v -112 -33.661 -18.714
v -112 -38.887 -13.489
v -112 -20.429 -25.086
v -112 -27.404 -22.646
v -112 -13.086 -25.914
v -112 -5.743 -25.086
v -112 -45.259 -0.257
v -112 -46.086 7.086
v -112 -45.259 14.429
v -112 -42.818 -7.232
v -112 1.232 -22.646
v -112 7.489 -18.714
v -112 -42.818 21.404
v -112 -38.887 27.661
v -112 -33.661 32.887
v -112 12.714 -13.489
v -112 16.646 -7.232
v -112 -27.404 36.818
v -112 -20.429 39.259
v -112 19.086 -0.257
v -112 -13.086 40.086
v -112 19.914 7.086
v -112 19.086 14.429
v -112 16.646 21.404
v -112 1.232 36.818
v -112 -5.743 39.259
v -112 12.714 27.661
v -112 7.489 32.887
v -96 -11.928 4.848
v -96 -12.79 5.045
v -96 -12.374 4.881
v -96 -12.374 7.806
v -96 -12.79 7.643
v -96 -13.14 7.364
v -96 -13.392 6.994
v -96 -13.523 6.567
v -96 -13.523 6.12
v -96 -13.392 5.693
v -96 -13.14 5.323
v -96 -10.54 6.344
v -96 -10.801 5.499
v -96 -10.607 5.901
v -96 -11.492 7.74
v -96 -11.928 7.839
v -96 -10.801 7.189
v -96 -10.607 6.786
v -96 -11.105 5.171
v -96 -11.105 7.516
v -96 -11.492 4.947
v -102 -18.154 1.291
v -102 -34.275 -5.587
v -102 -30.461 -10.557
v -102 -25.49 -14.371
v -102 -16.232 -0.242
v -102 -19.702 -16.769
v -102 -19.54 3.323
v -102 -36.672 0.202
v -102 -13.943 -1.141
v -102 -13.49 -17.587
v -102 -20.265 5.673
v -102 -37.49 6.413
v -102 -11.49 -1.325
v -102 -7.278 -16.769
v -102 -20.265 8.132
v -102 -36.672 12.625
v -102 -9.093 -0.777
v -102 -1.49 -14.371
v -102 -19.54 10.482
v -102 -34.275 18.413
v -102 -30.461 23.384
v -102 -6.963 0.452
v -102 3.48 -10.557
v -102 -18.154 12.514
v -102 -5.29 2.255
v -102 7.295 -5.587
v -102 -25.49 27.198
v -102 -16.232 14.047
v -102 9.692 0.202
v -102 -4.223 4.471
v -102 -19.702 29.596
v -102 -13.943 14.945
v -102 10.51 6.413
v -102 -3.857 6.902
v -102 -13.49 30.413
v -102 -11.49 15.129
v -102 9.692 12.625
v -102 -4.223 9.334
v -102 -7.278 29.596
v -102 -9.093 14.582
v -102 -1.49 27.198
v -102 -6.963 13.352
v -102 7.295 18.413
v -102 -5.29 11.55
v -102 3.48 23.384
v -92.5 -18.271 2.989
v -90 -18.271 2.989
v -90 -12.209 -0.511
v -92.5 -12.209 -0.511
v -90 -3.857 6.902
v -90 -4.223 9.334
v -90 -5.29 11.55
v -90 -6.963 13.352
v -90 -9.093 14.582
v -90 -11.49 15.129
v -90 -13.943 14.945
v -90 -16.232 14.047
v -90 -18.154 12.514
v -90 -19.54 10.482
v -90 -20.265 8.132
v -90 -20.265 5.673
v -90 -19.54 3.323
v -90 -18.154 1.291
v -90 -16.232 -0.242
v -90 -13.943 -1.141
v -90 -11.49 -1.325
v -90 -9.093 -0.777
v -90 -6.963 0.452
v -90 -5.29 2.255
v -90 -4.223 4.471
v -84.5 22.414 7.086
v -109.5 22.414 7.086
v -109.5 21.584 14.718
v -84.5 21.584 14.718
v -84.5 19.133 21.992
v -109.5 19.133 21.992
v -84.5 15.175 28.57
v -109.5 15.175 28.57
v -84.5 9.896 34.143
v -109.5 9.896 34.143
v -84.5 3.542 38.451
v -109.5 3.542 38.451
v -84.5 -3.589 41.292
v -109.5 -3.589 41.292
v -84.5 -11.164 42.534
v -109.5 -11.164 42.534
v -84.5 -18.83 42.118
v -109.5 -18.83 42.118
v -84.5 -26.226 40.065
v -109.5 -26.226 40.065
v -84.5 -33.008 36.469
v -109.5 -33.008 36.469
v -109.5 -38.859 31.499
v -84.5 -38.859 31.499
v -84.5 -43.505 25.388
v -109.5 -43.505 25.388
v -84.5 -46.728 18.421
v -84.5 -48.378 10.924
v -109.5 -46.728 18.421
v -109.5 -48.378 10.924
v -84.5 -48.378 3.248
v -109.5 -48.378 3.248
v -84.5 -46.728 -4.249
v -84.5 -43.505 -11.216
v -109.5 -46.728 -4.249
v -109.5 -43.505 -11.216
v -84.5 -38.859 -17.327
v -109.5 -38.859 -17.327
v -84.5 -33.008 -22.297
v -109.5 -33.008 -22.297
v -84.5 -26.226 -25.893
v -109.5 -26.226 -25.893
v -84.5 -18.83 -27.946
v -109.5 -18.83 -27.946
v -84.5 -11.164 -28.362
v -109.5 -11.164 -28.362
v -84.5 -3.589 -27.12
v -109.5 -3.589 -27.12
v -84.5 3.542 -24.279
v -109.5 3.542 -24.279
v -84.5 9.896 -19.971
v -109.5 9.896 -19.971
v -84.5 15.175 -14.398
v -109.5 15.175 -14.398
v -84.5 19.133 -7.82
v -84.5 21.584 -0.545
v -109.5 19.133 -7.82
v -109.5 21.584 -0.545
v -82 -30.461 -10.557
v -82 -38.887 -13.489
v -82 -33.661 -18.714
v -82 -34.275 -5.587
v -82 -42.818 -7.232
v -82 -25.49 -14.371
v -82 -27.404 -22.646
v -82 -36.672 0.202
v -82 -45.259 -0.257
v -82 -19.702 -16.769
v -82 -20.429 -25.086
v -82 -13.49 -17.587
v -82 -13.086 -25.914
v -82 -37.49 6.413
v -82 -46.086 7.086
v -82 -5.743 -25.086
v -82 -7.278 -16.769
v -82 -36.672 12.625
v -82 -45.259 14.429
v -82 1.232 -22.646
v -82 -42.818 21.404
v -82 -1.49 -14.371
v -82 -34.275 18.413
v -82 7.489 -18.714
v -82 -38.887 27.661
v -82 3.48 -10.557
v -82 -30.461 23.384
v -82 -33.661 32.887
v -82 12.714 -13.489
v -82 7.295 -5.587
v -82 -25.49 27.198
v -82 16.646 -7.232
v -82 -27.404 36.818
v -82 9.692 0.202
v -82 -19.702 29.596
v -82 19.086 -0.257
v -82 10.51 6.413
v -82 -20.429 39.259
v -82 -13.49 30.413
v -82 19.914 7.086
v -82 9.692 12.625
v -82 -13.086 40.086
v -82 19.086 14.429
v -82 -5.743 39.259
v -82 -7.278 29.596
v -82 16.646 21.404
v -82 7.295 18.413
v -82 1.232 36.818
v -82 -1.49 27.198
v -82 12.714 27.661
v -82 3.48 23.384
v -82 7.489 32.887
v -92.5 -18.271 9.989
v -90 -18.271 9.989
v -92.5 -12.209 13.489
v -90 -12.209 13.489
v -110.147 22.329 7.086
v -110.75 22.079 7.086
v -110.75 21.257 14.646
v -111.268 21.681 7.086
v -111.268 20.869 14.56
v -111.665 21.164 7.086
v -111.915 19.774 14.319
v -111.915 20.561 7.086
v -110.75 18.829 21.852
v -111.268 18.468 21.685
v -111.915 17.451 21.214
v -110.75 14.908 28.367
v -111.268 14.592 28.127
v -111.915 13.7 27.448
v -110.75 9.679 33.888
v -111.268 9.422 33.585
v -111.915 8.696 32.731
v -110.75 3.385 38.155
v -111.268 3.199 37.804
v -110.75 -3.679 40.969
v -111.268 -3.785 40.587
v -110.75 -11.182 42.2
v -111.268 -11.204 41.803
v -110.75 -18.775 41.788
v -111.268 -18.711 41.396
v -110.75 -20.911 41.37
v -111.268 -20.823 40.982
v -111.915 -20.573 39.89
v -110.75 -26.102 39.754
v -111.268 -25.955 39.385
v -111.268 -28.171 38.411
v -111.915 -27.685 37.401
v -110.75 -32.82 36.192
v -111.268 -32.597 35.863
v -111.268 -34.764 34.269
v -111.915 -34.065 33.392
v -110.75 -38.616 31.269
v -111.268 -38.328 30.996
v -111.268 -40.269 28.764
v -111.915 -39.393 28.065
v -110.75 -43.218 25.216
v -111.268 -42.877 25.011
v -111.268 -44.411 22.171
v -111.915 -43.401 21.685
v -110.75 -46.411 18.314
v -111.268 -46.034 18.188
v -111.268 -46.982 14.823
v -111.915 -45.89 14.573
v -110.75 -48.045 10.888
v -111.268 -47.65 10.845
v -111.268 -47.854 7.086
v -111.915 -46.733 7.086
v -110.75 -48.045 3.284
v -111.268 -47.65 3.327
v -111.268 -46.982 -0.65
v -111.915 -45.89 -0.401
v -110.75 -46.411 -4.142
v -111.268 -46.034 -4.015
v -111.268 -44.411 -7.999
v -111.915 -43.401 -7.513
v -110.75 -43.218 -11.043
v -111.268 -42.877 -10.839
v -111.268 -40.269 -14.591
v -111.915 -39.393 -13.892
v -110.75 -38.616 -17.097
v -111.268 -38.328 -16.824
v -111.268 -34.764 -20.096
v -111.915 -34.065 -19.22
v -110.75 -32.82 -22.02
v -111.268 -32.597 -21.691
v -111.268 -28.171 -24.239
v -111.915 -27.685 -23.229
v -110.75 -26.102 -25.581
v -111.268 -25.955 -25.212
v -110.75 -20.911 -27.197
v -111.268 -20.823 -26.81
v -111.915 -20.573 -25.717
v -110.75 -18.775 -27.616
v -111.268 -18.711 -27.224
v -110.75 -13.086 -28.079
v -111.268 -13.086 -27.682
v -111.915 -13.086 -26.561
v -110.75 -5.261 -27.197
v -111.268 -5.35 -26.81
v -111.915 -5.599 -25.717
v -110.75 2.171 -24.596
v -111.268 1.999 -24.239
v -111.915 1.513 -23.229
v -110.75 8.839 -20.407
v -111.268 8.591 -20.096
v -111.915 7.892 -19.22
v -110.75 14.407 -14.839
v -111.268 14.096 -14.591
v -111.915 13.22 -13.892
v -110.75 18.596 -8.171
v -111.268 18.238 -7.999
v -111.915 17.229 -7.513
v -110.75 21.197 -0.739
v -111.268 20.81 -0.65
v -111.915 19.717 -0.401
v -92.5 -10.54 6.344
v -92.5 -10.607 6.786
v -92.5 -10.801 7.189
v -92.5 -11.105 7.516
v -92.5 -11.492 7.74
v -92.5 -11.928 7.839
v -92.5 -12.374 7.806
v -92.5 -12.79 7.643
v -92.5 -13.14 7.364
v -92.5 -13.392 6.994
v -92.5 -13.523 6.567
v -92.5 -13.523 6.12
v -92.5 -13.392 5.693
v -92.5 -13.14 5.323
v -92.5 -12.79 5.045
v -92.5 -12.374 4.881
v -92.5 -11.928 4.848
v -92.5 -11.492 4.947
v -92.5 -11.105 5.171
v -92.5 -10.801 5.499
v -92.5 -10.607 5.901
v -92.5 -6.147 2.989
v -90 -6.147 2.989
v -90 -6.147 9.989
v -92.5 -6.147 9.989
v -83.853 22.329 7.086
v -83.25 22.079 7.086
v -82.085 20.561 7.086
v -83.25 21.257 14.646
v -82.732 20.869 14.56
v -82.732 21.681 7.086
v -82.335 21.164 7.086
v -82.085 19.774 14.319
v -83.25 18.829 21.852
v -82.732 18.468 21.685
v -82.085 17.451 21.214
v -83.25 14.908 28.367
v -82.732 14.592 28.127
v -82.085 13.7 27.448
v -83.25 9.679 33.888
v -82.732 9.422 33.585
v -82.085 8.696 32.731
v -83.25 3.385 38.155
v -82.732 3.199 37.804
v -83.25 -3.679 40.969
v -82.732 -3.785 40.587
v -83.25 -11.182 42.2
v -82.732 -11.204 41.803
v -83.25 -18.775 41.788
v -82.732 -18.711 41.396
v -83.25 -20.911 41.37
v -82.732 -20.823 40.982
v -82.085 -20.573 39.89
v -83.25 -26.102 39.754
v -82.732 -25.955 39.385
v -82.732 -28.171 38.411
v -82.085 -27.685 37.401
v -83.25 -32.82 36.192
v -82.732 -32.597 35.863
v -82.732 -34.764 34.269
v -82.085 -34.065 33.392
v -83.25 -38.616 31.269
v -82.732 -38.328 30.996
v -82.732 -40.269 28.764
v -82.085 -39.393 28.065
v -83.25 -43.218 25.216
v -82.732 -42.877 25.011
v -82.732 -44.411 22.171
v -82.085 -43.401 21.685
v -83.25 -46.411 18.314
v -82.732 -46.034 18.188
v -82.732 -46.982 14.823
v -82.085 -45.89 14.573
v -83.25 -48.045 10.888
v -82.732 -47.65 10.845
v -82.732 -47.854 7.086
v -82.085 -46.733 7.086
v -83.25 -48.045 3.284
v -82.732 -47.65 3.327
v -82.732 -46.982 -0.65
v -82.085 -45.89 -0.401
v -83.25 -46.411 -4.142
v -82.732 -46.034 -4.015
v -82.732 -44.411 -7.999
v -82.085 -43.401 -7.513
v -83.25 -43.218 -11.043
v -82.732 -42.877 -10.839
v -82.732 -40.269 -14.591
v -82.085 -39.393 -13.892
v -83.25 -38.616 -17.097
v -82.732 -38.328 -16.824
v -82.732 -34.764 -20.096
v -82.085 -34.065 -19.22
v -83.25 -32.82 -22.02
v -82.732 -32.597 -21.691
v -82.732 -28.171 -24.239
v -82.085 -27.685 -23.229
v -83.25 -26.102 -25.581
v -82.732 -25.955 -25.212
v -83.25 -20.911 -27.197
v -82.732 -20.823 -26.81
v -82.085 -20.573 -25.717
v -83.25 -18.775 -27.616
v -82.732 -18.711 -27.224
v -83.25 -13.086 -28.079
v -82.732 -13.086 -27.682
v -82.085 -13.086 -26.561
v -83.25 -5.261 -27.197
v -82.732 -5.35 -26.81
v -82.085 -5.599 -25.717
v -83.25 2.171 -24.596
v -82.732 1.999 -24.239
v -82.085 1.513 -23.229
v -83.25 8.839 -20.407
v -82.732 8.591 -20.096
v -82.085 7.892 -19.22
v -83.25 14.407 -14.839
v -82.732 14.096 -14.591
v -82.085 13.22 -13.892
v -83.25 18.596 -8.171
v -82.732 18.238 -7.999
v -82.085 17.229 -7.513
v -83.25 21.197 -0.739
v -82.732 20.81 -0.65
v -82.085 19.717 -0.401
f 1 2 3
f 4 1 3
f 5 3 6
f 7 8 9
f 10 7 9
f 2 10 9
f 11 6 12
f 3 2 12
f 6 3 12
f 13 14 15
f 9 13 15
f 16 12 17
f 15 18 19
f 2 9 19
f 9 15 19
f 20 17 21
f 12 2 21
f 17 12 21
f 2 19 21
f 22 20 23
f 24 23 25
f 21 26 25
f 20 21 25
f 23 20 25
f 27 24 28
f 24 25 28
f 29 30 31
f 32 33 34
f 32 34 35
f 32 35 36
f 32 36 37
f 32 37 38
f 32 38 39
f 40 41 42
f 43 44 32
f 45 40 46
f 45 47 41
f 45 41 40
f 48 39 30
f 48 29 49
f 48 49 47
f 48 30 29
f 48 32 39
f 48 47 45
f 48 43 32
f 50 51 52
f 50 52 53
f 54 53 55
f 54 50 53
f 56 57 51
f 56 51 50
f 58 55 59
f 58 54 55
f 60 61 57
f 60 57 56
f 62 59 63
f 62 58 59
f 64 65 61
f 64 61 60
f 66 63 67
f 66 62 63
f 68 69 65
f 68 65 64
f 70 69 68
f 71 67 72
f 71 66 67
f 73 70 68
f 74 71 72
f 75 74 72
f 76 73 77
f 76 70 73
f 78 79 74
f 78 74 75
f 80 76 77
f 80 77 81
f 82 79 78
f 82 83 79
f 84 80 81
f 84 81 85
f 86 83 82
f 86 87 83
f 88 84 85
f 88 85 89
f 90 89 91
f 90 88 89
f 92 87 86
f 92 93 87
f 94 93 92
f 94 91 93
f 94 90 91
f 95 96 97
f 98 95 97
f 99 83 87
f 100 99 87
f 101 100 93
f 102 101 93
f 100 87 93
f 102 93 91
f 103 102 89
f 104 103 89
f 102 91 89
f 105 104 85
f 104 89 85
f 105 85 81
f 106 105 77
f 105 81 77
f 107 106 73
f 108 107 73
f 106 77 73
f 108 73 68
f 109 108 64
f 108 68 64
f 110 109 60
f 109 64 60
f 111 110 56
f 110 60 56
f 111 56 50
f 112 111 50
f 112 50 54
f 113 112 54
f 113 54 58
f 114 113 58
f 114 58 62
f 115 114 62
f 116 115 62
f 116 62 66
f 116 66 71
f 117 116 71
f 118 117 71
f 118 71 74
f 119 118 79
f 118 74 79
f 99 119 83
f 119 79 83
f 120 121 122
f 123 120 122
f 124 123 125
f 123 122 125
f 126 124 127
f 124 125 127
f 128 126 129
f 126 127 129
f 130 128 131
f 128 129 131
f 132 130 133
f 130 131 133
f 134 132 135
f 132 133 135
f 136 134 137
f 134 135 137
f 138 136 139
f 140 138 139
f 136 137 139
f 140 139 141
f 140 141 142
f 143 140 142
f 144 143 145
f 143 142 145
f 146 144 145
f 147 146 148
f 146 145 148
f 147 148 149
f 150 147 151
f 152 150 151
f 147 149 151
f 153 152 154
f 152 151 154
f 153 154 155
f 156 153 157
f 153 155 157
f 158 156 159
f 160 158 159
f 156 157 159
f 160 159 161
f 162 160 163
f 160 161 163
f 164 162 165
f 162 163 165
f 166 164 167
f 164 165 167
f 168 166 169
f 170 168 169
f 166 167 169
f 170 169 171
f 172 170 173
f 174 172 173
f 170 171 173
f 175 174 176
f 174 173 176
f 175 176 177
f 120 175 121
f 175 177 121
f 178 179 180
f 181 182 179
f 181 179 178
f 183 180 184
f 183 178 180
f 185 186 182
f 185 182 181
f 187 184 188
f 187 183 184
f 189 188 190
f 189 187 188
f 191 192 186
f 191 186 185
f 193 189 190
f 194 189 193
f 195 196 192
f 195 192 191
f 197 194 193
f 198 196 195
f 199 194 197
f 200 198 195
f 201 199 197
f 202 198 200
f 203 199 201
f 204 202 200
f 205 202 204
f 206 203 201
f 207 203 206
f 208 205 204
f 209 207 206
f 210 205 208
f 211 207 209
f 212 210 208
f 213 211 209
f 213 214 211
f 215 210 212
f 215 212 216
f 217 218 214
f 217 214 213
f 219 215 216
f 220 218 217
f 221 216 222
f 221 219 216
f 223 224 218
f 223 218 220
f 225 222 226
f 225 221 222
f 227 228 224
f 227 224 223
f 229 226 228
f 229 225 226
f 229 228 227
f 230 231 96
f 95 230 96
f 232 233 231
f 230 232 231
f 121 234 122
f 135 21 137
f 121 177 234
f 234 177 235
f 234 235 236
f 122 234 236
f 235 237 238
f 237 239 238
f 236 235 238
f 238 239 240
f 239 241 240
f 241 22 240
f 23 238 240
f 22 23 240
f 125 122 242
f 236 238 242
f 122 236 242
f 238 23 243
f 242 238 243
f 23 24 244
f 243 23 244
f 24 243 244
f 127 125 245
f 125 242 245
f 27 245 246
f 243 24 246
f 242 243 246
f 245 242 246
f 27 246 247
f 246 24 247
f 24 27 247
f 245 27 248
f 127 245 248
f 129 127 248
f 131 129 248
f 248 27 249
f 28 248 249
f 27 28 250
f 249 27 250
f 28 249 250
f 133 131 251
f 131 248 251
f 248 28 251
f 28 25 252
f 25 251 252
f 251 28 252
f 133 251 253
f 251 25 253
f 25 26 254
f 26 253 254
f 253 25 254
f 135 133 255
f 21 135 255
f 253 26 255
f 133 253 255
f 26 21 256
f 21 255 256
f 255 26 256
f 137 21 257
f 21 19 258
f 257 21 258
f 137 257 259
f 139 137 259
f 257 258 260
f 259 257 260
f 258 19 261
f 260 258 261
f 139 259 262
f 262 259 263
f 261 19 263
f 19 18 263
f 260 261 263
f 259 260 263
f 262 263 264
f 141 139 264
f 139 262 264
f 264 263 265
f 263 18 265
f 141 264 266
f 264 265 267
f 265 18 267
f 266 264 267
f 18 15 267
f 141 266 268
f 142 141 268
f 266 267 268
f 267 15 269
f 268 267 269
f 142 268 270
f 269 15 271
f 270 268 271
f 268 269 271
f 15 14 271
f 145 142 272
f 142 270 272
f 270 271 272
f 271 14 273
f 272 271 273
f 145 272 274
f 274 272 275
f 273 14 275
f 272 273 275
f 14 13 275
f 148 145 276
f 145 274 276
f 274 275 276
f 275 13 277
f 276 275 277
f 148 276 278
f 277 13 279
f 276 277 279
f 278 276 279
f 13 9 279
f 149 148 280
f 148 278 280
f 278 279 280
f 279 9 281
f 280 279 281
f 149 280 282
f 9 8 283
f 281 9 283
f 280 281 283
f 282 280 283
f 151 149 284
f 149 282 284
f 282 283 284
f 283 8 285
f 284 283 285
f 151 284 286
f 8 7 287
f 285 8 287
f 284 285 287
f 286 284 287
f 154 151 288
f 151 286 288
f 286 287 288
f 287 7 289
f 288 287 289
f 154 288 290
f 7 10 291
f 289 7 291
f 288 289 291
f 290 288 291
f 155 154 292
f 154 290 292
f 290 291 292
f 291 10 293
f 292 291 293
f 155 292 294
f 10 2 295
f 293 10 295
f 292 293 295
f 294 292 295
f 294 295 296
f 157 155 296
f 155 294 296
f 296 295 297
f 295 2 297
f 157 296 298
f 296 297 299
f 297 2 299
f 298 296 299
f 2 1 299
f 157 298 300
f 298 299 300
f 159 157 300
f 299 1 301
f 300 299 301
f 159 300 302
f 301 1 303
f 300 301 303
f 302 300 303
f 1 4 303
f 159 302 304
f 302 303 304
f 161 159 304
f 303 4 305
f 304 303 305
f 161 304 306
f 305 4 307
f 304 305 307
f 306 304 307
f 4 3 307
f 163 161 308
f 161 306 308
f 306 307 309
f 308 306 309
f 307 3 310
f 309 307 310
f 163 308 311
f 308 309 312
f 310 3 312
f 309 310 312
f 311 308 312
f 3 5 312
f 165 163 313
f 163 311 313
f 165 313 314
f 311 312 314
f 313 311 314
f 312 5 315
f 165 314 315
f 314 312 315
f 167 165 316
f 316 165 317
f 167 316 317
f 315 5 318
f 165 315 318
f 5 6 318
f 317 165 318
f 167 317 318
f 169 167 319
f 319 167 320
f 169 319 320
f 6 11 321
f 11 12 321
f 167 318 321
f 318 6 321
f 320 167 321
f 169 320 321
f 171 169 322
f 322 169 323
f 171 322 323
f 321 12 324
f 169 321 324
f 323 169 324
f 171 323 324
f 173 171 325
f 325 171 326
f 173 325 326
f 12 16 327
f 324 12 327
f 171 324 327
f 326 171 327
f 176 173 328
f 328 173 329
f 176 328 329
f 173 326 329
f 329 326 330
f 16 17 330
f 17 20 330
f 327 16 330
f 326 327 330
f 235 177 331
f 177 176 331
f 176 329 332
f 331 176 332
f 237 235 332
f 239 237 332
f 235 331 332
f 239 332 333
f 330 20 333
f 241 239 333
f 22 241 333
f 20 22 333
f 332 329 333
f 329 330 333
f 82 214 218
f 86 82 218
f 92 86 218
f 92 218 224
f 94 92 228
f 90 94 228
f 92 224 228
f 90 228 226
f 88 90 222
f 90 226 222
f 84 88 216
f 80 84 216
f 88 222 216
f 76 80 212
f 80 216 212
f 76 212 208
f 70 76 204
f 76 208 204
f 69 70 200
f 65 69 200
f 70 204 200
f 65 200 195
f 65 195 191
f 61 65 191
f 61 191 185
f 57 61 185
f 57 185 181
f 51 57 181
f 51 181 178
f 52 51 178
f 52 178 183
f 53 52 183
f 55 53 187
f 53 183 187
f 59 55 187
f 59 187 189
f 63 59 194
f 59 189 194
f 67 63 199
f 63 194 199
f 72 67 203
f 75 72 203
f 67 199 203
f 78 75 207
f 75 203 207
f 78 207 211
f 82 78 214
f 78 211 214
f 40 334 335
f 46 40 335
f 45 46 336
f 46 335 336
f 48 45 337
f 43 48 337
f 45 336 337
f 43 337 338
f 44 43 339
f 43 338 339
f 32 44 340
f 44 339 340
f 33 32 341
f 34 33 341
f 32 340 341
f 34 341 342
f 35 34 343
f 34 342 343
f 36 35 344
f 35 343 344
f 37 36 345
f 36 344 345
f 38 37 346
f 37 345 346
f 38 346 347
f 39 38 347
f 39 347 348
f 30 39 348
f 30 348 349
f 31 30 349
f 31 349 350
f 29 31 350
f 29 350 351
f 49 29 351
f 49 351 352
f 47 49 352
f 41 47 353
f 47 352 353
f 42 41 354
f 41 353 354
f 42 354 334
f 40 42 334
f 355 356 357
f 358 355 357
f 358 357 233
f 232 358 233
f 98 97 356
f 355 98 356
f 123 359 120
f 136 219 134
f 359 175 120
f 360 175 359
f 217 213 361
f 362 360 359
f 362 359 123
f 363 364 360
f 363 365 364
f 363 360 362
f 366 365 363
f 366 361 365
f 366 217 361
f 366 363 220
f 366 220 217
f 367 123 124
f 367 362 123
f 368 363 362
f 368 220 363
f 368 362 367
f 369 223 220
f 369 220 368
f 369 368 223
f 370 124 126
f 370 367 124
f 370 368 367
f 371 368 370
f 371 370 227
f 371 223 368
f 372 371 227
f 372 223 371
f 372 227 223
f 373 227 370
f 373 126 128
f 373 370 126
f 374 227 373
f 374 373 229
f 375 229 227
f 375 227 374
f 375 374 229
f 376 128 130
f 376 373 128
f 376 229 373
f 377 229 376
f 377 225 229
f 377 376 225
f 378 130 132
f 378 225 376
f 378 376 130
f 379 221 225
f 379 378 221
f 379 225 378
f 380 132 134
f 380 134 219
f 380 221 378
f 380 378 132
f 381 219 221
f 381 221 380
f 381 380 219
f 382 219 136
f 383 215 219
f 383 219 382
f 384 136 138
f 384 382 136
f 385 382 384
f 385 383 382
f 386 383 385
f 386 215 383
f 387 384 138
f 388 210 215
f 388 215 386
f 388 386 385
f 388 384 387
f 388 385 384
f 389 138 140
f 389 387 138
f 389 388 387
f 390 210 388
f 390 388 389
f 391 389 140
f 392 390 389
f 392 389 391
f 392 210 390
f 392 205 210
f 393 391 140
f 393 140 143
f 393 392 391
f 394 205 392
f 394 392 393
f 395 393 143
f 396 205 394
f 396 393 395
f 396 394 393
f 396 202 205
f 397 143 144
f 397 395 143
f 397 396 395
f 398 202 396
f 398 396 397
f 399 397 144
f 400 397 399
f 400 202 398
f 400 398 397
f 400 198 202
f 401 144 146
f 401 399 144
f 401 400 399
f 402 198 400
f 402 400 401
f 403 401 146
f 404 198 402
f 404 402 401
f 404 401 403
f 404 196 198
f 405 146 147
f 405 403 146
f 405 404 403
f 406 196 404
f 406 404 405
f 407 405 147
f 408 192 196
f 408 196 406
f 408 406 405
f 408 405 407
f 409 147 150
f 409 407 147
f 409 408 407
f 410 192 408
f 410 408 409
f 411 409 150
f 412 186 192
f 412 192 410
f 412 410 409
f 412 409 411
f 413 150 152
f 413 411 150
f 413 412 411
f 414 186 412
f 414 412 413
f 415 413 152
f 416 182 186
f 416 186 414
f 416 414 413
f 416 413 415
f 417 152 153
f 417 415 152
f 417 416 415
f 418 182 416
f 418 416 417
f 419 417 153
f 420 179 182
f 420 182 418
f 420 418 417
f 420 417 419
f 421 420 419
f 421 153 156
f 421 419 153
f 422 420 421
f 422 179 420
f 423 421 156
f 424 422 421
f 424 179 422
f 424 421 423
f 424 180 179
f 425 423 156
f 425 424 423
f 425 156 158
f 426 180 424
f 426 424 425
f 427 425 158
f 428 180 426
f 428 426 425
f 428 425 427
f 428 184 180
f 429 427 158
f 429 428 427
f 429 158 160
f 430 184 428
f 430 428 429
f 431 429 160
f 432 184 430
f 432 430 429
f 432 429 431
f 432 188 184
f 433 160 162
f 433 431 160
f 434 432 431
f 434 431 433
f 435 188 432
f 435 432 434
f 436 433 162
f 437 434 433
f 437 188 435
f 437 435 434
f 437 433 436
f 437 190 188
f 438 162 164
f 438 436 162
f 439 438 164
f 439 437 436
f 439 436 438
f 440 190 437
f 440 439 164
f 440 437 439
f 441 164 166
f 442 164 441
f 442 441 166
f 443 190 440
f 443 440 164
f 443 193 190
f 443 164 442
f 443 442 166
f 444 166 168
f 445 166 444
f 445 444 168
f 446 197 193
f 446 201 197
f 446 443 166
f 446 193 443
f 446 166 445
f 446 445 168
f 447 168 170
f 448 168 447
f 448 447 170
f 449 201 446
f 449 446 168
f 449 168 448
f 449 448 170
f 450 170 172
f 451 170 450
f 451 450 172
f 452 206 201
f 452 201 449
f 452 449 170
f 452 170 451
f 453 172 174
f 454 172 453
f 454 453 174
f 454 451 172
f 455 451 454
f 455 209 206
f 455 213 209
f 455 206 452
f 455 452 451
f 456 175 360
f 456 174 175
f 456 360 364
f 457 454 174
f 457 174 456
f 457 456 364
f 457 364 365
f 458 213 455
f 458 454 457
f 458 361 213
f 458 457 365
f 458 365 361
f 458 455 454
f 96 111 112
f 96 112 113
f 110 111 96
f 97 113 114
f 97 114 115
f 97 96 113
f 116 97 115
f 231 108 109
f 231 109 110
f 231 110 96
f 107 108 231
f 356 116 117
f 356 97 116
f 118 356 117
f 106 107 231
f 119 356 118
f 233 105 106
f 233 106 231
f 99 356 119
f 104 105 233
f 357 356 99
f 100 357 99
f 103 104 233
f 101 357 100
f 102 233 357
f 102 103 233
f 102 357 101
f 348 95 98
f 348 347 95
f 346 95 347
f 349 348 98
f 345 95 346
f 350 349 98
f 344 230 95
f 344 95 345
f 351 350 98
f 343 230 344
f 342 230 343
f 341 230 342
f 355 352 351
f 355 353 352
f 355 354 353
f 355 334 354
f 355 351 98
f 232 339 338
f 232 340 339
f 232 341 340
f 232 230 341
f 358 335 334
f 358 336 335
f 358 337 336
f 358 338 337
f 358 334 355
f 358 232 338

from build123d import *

# Parameters (mm, degrees)
SKETCH034_R     = 35.5
PAD014_DEPTH    = 30
FILLET018_R     = 2.5
FILLET019_R     = 2.5
SKETCH035_R     = 24
POCKET003_DEPTH = 20
SKETCH036_R     = 8.25
PAD015_DEPTH    = 12
POCKET004_DEPTH = 2.5
SKETCH038_R     = 1.5
POCKET005_DEPTH = 3.5


with BuildPart() as part:
    # Sketch034 → Pad014 (new body)
    with BuildSketch(Plane.YZ):
        with Locations((-2.086276, 2.086154)):
            Circle(SKETCH034_R)
    extrude(amount=PAD014_DEPTH)

    # Fillet018
    fillet018_edges = [part.edges().sort_by_distance(p)[0] for p in [
        (30, -37.586276, 2.086154),
    ]]
    fillet(fillet018_edges, radius=FILLET018_R)

    # Fillet019
    fillet019_edges = [part.edges().sort_by_distance(p)[0] for p in [
        (0, -37.586276, 2.086154),
    ]]
    fillet(fillet019_edges, radius=FILLET019_R)

    # Sketch035 (on Face3 of Pad014) → Pocket003 (cut)
    with BuildSketch(Plane.YZ.offset(30)):
        with Locations((-2.490074, 1.413427)):
            Circle(SKETCH035_R)
    extrude(amount=-POCKET003_DEPTH, mode=Mode.SUBTRACT)

    # Sketch036 (on Face7 of Pocket003) → Pad015 (join)
    with BuildSketch(Plane.YZ.offset(10)):
        with Locations((-1.106776, 1.902246)):
            Circle(SKETCH036_R)
    extrude(amount=PAD015_DEPTH)

    # Sketch037 (on Face9 of Pad015) → Pocket004 (cut)
    with BuildSketch(Plane.YZ.offset(22)):
        Polygon((4.852949, 4.988847), (-1.209229, 8.488847), (-7.271407, 4.988847), (-7.271407, -2.011153), (-1.209229, -5.511153), (4.852949, -2.011153), align=None)
    extrude(amount=-POCKET004_DEPTH, mode=Mode.SUBTRACT)

    # Sketch038 (on Face16 of Pocket004) → Pocket005 (cut)
    with BuildSketch(Plane.YZ.offset(19.5)):
        with Locations((-1.040093, 1.343548)):
            Circle(SKETCH038_R)
    extrude(amount=-POCKET005_DEPTH, mode=Mode.SUBTRACT)


with BuildPart() as part_1:
    # Body002 placement: moved
    add(part.part.moved(Location((-112, -11, 5))))


solid = part_1.part
